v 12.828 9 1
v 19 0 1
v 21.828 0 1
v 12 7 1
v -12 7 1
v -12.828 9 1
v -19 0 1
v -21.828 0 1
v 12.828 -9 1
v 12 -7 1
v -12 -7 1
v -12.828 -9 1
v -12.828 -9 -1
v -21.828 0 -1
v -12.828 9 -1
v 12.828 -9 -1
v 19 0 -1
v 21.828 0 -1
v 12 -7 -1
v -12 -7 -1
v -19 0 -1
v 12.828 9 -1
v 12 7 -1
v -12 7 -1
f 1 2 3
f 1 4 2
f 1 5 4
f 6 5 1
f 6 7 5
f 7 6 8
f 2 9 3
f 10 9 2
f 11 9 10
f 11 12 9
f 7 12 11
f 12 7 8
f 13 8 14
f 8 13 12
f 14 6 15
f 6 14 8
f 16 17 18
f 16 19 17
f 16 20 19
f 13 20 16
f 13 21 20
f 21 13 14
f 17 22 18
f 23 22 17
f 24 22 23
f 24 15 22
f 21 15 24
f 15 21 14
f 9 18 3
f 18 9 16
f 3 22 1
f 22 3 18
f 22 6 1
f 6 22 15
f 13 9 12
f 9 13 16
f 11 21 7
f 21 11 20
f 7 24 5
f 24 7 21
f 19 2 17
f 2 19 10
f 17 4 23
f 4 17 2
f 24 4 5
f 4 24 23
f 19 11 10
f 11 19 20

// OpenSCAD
// file: plug_hole.scad
module figure(dims) {
  union() {
    square_diagonal = dims.y;
    square_side = square_diagonal / sqrt(2);
    square_z = dims.z;

    translate([-(dims.x - square_diagonal) / 2, 0, 0])
    rotate(a = 45, v = [0, 0, 1]) 
    cube([square_side, square_side, dims.z], center = true);

    translate([(dims.x - square_diagonal) / 2, 0,0])
    rotate(a = 45, v = [0, 0, 1]) 
    cube([square_side, square_side, dims.z], center = true);
    
    // Base
    cube([dims.x - dims.y, dims.y, dims.z], center = true);
  }
}

plug_hole_inner_width = 38;
plug_hole_inner_height = 14;

function fn_hole_outer_width(border_thickness) = plug_hole_inner_width + border_thickness * 2 * sqrt(2);

module plug_hole(border_thickness = 2, h = 2, thin = true) {
  border_x = border_thickness * sqrt(2);
  border_y = border_thickness;  

  difference() {
    if (thin) {
      figure([plug_hole_inner_width + 2 * border_x, plug_hole_inner_height + 2 * border_y, h]);
    } else {
      cube([plug_hole_inner_width + 2 * border_x, plug_hole_inner_height + 2 * border_y, h], center = true);
    }

    figure([plug_hole_inner_width, plug_hole_inner_height, h]);
  }
}
// main file
include <./plug_hole.scad>

plug_hole(border_thickness = 2, h = 2, thin = true);
